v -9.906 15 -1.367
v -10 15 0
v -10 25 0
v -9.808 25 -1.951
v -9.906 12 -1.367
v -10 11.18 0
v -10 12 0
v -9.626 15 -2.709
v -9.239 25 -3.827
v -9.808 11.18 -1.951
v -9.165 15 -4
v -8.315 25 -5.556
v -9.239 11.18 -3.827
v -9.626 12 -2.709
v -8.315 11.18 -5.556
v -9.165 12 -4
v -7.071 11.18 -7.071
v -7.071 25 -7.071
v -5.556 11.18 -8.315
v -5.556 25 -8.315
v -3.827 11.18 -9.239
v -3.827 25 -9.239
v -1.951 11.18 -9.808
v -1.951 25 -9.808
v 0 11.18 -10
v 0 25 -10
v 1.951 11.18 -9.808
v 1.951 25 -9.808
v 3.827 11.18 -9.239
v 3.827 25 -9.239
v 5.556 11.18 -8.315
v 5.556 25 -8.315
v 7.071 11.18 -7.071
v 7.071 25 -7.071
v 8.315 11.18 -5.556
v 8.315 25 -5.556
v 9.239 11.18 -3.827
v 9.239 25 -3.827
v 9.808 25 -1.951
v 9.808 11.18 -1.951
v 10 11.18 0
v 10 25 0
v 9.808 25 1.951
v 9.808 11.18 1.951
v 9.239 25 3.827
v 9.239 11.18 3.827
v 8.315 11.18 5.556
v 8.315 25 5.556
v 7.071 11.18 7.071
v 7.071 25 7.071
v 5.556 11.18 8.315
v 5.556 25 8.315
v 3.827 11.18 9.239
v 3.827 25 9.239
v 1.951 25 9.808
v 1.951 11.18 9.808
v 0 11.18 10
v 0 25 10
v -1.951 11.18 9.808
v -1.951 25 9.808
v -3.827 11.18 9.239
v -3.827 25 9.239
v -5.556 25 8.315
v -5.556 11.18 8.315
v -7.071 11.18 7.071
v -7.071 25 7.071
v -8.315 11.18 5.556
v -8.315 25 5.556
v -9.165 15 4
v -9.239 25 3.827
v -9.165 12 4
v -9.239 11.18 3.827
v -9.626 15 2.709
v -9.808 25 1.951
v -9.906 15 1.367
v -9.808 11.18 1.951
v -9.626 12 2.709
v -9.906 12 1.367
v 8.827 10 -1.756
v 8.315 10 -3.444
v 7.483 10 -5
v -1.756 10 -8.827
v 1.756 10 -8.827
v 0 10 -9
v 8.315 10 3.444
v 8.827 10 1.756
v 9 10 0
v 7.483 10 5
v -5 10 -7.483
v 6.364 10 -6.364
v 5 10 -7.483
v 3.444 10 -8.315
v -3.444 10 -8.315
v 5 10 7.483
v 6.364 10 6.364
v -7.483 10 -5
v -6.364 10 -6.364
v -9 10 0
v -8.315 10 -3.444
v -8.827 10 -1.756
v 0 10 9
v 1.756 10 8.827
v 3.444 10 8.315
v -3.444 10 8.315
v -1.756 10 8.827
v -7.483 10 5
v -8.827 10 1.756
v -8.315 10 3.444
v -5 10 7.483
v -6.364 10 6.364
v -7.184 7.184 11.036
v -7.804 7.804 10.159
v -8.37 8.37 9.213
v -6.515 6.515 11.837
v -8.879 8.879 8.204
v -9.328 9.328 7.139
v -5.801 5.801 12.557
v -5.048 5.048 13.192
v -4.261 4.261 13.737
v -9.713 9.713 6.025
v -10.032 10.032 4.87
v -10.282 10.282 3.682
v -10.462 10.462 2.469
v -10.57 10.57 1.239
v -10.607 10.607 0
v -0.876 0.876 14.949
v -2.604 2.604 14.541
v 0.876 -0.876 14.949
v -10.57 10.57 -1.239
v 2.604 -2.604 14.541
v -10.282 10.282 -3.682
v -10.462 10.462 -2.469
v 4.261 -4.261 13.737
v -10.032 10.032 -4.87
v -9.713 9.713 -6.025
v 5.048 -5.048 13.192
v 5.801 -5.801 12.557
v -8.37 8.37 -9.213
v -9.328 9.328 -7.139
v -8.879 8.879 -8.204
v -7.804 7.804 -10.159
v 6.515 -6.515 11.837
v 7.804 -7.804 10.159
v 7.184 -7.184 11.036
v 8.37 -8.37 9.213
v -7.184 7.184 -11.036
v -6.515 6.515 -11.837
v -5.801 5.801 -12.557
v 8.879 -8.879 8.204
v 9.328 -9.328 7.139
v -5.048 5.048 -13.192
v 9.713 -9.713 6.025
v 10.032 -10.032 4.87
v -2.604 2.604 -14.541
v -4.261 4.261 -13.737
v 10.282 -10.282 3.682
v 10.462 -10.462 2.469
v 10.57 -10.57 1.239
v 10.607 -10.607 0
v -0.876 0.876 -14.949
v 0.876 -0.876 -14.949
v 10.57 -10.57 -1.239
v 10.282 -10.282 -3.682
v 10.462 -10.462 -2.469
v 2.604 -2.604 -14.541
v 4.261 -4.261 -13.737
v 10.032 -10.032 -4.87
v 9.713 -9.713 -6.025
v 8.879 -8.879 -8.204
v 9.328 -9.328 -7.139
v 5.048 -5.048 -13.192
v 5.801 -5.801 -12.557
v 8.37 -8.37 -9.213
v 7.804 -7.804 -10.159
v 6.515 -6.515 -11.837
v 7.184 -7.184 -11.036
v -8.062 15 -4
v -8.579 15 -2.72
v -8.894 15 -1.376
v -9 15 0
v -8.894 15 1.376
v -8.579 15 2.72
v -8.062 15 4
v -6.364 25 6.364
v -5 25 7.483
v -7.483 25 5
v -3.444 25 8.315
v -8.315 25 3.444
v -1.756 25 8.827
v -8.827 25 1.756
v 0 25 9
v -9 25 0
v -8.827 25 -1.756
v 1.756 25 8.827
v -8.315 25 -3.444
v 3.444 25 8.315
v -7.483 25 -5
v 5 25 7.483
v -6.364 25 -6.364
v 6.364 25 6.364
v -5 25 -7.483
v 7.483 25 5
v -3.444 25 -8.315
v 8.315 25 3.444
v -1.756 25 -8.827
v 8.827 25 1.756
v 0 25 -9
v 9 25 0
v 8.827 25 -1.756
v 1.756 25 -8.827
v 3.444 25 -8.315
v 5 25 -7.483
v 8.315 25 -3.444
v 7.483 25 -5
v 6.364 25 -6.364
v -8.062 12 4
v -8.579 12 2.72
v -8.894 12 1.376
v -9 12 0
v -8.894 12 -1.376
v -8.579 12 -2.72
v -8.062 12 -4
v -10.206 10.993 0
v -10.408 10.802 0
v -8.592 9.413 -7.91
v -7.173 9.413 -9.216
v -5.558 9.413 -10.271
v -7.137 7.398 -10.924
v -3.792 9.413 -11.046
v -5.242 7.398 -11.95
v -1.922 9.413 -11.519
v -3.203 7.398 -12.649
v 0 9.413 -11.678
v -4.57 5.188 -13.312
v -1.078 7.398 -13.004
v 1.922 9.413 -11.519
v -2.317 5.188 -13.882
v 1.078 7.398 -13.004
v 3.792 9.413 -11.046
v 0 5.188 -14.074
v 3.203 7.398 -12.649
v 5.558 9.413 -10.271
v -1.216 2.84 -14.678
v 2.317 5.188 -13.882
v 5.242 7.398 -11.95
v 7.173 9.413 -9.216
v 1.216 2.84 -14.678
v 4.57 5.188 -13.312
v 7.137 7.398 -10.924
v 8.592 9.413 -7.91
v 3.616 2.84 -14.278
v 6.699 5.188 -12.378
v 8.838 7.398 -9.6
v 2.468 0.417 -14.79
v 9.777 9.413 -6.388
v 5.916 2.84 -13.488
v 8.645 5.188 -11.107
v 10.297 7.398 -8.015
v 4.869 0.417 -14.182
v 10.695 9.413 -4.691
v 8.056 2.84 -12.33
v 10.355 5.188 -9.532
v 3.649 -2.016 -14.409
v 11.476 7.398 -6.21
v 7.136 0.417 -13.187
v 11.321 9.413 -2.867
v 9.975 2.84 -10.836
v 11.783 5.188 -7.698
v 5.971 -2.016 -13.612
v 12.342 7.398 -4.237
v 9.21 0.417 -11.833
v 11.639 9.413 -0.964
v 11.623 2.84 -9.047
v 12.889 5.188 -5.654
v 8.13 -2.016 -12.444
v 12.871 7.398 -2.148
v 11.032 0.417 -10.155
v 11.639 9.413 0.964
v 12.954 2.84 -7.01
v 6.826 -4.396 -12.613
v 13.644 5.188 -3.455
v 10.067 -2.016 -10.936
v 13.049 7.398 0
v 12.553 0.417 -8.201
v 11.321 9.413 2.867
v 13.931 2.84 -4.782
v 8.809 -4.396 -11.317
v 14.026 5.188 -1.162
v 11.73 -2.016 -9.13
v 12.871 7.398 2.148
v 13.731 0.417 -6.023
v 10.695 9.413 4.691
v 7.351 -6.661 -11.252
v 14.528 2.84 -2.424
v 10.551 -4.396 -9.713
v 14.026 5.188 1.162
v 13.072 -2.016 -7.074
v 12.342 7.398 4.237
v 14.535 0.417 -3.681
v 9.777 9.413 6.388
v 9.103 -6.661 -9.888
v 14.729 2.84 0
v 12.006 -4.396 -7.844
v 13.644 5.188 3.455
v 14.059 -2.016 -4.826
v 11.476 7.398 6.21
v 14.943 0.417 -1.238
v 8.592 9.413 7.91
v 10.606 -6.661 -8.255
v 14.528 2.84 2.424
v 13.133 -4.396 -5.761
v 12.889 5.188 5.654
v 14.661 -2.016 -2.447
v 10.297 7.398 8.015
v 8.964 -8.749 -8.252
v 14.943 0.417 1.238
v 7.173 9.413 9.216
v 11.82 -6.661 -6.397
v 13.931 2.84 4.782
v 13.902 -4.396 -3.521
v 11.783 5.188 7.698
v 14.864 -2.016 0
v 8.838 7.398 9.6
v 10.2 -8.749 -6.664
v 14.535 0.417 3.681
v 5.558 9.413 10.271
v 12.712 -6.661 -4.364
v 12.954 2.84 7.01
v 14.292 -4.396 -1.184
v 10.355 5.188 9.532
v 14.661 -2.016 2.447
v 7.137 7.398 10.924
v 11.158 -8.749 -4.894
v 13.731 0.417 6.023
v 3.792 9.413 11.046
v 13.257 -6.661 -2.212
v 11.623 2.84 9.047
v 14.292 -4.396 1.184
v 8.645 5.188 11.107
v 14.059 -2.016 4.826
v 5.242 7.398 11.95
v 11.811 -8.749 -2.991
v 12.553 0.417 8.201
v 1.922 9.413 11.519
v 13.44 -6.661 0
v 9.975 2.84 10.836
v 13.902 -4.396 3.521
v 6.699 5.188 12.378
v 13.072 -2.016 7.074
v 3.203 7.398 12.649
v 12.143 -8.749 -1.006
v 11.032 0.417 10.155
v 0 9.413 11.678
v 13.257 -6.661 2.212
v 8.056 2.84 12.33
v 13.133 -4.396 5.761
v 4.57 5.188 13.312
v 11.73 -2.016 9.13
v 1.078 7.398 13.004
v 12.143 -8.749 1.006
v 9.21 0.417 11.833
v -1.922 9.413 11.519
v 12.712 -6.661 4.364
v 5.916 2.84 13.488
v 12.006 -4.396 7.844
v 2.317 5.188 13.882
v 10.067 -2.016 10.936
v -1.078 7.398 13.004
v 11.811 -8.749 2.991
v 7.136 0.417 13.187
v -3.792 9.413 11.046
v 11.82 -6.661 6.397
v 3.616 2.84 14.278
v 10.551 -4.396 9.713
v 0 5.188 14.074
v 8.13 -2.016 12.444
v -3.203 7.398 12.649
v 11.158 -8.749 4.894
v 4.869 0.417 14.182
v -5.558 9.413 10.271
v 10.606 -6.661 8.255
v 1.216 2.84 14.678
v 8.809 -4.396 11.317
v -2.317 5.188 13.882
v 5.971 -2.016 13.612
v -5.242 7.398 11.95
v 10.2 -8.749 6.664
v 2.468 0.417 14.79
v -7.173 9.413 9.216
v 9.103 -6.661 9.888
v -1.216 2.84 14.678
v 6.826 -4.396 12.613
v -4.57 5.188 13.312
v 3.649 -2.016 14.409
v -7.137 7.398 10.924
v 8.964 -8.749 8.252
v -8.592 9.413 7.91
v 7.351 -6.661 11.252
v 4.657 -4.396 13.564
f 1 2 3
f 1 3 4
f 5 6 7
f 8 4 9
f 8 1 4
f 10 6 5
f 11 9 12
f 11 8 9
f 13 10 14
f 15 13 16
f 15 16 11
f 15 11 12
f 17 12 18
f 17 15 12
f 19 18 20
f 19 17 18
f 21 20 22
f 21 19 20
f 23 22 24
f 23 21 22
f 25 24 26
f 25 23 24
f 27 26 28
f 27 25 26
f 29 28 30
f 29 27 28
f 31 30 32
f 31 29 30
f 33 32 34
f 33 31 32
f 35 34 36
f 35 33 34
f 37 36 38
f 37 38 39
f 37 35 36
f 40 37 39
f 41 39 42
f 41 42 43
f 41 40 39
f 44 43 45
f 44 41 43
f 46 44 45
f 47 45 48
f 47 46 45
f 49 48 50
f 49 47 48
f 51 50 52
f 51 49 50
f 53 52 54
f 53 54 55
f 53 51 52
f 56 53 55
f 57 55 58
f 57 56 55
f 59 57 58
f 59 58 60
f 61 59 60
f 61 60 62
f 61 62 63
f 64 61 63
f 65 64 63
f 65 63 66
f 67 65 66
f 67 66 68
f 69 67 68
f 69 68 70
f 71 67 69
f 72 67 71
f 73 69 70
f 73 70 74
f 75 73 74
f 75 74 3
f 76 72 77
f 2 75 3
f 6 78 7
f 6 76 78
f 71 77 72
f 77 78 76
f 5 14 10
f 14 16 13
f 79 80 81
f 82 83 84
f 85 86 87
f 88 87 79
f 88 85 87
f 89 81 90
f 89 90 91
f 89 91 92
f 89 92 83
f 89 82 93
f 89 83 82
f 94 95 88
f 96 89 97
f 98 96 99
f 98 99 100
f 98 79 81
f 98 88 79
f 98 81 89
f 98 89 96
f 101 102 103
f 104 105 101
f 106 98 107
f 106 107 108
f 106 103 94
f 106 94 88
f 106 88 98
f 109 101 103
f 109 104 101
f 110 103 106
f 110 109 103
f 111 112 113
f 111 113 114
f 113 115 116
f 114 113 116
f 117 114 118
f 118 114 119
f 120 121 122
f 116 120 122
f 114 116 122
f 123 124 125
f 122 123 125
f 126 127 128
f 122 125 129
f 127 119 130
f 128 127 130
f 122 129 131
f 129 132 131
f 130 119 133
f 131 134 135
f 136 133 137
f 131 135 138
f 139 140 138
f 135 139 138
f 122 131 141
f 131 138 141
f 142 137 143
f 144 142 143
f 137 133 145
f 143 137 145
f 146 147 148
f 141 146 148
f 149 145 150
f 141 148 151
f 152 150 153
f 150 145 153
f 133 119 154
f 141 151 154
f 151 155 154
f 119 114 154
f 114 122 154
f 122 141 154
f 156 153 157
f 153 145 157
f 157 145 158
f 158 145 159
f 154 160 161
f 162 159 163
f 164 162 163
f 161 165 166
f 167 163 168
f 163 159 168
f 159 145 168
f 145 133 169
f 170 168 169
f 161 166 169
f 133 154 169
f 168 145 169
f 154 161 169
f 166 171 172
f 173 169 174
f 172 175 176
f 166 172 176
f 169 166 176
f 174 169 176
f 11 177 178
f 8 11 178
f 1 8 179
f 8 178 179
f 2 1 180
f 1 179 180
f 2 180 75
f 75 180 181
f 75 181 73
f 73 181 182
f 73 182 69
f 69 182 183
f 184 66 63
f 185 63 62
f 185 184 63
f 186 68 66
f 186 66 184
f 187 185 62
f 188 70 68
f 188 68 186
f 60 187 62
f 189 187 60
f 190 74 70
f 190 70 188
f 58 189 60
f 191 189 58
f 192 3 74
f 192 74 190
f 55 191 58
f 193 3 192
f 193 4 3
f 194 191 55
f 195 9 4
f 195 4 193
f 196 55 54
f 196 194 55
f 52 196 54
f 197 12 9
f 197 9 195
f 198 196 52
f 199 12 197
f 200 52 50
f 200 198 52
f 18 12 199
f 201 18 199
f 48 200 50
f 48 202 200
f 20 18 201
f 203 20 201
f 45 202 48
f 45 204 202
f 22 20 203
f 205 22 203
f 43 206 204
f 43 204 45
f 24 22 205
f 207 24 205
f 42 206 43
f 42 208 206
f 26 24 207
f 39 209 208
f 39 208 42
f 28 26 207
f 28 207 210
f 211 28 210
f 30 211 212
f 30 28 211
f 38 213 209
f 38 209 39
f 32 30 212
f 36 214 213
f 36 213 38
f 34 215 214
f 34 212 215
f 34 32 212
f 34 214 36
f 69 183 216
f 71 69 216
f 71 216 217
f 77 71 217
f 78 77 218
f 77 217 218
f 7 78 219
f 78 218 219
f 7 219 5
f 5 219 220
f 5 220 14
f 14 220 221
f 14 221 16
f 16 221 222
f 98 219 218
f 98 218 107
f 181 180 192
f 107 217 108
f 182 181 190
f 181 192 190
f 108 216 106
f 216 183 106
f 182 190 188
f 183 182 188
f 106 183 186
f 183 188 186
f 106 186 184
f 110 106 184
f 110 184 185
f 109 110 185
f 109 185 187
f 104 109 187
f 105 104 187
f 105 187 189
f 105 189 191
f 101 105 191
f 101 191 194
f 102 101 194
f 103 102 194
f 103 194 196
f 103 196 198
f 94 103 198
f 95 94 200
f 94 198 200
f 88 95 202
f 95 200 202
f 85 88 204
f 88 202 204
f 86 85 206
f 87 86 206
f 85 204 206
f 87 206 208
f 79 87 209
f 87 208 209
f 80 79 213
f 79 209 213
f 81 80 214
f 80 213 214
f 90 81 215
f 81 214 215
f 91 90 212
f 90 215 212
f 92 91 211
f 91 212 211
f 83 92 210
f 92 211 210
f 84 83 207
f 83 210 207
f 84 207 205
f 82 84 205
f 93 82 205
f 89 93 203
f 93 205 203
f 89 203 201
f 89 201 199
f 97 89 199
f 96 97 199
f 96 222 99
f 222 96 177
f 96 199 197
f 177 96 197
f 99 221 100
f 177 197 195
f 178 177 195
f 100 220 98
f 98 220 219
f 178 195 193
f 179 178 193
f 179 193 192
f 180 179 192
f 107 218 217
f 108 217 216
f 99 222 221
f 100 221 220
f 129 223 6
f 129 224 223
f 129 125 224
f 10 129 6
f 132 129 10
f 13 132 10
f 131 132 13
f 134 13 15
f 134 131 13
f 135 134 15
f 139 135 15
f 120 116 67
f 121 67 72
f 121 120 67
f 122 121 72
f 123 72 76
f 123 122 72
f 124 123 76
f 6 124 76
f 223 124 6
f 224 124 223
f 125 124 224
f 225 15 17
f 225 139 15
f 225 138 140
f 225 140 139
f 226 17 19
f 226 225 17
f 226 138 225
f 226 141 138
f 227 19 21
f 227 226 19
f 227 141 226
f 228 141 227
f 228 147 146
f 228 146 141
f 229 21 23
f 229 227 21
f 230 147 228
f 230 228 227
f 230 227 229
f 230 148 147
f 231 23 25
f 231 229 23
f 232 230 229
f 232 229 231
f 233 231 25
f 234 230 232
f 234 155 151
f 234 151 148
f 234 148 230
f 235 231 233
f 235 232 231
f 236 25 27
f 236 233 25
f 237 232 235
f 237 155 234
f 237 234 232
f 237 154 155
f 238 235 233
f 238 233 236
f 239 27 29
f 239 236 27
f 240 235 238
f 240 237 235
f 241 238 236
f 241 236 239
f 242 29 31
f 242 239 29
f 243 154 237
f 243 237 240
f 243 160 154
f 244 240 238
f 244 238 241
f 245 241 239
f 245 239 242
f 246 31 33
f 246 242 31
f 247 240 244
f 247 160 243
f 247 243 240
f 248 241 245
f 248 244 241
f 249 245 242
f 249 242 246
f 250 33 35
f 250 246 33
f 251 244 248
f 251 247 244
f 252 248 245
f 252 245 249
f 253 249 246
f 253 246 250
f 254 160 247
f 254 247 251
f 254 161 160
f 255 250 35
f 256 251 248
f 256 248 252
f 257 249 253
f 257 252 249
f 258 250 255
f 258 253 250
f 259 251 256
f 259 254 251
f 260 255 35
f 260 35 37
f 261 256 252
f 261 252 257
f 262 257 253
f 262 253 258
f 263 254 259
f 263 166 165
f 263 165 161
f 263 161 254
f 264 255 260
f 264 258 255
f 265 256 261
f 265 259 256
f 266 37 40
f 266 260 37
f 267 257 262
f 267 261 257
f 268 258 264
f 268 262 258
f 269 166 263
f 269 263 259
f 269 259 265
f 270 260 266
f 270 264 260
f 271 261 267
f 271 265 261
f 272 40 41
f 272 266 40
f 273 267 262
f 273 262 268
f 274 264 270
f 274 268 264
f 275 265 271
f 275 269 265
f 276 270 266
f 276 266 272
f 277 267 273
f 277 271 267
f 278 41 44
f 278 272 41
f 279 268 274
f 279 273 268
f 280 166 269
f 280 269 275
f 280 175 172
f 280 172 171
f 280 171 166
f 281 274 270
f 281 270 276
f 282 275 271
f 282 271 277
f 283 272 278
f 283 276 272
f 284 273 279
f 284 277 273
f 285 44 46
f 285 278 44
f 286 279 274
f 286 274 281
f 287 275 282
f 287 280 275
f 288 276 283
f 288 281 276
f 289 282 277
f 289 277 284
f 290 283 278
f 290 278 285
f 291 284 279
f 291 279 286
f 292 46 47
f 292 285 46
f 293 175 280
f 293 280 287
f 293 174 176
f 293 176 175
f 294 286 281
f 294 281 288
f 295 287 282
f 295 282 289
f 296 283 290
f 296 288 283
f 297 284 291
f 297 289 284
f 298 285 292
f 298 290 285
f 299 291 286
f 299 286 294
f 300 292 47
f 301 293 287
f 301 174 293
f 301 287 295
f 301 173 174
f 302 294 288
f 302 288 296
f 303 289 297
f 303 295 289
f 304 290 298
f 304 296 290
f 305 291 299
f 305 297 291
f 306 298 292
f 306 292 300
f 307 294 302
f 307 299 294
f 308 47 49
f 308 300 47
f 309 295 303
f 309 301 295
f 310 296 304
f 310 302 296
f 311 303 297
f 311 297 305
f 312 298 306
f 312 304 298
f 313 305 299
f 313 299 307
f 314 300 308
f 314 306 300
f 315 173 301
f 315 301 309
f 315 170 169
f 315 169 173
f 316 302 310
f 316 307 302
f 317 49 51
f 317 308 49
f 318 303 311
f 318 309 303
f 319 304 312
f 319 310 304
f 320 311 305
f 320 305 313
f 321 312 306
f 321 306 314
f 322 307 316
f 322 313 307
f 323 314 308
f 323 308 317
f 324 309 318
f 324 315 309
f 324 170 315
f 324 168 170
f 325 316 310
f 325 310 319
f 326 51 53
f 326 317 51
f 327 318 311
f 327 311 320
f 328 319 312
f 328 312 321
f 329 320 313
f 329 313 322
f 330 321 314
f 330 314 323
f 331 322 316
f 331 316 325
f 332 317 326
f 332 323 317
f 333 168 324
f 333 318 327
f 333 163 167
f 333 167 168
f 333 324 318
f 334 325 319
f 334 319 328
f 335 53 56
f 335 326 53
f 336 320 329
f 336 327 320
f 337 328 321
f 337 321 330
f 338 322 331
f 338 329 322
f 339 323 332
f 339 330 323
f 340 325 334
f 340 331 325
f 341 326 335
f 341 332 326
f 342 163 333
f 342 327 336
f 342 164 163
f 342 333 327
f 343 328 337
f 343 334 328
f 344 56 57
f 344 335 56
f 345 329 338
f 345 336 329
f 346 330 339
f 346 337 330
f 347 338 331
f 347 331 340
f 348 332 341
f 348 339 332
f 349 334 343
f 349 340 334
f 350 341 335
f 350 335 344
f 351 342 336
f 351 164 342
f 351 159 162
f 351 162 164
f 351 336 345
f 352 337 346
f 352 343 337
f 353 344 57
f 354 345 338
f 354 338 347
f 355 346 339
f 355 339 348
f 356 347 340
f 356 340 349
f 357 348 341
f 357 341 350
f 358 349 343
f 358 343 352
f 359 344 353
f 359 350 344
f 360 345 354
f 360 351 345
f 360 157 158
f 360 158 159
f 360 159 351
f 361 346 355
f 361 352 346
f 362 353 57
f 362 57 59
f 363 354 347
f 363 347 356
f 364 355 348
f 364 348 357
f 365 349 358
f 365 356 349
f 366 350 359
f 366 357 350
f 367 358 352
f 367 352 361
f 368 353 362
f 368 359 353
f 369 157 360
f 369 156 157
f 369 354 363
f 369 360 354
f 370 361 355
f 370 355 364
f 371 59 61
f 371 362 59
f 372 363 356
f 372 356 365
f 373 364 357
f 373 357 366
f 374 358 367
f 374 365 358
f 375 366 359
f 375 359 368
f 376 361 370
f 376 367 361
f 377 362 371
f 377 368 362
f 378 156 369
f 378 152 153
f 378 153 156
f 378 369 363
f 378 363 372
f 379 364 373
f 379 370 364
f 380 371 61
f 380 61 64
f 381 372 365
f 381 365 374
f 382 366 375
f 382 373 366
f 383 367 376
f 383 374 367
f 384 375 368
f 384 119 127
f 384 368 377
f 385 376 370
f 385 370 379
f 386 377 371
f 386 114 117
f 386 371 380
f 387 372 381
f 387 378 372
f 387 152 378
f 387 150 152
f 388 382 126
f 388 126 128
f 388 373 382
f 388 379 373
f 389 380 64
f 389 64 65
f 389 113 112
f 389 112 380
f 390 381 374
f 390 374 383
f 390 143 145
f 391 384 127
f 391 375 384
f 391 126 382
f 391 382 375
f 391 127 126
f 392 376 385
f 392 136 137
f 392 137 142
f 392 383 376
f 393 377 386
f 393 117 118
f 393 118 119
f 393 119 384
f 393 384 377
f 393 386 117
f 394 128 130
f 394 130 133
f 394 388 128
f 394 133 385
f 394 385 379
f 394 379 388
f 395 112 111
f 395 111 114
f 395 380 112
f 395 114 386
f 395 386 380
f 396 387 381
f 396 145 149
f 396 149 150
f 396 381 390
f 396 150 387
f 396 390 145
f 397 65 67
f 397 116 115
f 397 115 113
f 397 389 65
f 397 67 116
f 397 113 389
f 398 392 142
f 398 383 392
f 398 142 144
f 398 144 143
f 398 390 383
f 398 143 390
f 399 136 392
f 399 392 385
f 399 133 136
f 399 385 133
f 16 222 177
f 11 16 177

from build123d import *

# Parameters (mm, degrees)
CUT_EXTRUDE_1_DEPTH      = 33.787192622
CUT_EXTRUDE_1_DEPTH_BACK = 33.787192622
SKETCH_5_R               = 9
CUT_EXTRUDE_2_DEPTH      = 15
CUT_EXTRUDE_3_DEPTH      = 14


with BuildPart() as part:
    # 草图1 → 旋转2 (revolve)
    with BuildSketch(Plane.XY):
        with BuildLine():
            Line((-10, 25), (-10, 11.180339887))
            ThreePointArc((-10, 11.180339887), (-14.012585384, -5.352331347), (0, -15))
            Line((0, -15), (0, 25))
            Line((0, 25), (-10, 25))
        make_face()
    revolve(axis=Axis((0, 25, 0), (0, -1, 0)))

    # 草图4 → 切除-拉伸1 (cut, two sides: drawn at the far end of the back side and taken through both)
    with BuildSketch(Plane.XY.offset(-CUT_EXTRUDE_1_DEPTH_BACK)):
        with BuildLine():
            ThreePointArc((10.606601718, -10.606601718), (-10.606601718, -10.606601718), (-10.606601718, 10.606601718))
            Line((-10.606601718, 10.606601718), (0, 0))
            Line((0, 0), (10.606601718, -10.606601718))
        make_face()
    extrude(amount=CUT_EXTRUDE_1_DEPTH + CUT_EXTRUDE_1_DEPTH_BACK, mode=Mode.SUBTRACT)

    # 草图5 → 切除-拉伸2 (cut)
    with BuildSketch(Plane(origin=(0, 25, 0), x_dir=(1, 0, 0), z_dir=(0, 1, 0))):
        with Locations(Location((0, 0, 0), (0, 0, 180))):
            Circle(SKETCH_5_R)
    extrude(amount=-CUT_EXTRUDE_2_DEPTH, mode=Mode.SUBTRACT)

    # 草图6 → 切除-拉伸3 (cut)
    with BuildSketch(Plane(origin=(0, 0, 0), x_dir=(0, 0, -1), z_dir=(1, 0, 0))):
        Polygon((0, 12), (4, 12), (4, 15), (-4, 15), (-4, 12), align=None)
    extrude(amount=-CUT_EXTRUDE_3_DEPTH, mode=Mode.SUBTRACT)


solid = part.part
